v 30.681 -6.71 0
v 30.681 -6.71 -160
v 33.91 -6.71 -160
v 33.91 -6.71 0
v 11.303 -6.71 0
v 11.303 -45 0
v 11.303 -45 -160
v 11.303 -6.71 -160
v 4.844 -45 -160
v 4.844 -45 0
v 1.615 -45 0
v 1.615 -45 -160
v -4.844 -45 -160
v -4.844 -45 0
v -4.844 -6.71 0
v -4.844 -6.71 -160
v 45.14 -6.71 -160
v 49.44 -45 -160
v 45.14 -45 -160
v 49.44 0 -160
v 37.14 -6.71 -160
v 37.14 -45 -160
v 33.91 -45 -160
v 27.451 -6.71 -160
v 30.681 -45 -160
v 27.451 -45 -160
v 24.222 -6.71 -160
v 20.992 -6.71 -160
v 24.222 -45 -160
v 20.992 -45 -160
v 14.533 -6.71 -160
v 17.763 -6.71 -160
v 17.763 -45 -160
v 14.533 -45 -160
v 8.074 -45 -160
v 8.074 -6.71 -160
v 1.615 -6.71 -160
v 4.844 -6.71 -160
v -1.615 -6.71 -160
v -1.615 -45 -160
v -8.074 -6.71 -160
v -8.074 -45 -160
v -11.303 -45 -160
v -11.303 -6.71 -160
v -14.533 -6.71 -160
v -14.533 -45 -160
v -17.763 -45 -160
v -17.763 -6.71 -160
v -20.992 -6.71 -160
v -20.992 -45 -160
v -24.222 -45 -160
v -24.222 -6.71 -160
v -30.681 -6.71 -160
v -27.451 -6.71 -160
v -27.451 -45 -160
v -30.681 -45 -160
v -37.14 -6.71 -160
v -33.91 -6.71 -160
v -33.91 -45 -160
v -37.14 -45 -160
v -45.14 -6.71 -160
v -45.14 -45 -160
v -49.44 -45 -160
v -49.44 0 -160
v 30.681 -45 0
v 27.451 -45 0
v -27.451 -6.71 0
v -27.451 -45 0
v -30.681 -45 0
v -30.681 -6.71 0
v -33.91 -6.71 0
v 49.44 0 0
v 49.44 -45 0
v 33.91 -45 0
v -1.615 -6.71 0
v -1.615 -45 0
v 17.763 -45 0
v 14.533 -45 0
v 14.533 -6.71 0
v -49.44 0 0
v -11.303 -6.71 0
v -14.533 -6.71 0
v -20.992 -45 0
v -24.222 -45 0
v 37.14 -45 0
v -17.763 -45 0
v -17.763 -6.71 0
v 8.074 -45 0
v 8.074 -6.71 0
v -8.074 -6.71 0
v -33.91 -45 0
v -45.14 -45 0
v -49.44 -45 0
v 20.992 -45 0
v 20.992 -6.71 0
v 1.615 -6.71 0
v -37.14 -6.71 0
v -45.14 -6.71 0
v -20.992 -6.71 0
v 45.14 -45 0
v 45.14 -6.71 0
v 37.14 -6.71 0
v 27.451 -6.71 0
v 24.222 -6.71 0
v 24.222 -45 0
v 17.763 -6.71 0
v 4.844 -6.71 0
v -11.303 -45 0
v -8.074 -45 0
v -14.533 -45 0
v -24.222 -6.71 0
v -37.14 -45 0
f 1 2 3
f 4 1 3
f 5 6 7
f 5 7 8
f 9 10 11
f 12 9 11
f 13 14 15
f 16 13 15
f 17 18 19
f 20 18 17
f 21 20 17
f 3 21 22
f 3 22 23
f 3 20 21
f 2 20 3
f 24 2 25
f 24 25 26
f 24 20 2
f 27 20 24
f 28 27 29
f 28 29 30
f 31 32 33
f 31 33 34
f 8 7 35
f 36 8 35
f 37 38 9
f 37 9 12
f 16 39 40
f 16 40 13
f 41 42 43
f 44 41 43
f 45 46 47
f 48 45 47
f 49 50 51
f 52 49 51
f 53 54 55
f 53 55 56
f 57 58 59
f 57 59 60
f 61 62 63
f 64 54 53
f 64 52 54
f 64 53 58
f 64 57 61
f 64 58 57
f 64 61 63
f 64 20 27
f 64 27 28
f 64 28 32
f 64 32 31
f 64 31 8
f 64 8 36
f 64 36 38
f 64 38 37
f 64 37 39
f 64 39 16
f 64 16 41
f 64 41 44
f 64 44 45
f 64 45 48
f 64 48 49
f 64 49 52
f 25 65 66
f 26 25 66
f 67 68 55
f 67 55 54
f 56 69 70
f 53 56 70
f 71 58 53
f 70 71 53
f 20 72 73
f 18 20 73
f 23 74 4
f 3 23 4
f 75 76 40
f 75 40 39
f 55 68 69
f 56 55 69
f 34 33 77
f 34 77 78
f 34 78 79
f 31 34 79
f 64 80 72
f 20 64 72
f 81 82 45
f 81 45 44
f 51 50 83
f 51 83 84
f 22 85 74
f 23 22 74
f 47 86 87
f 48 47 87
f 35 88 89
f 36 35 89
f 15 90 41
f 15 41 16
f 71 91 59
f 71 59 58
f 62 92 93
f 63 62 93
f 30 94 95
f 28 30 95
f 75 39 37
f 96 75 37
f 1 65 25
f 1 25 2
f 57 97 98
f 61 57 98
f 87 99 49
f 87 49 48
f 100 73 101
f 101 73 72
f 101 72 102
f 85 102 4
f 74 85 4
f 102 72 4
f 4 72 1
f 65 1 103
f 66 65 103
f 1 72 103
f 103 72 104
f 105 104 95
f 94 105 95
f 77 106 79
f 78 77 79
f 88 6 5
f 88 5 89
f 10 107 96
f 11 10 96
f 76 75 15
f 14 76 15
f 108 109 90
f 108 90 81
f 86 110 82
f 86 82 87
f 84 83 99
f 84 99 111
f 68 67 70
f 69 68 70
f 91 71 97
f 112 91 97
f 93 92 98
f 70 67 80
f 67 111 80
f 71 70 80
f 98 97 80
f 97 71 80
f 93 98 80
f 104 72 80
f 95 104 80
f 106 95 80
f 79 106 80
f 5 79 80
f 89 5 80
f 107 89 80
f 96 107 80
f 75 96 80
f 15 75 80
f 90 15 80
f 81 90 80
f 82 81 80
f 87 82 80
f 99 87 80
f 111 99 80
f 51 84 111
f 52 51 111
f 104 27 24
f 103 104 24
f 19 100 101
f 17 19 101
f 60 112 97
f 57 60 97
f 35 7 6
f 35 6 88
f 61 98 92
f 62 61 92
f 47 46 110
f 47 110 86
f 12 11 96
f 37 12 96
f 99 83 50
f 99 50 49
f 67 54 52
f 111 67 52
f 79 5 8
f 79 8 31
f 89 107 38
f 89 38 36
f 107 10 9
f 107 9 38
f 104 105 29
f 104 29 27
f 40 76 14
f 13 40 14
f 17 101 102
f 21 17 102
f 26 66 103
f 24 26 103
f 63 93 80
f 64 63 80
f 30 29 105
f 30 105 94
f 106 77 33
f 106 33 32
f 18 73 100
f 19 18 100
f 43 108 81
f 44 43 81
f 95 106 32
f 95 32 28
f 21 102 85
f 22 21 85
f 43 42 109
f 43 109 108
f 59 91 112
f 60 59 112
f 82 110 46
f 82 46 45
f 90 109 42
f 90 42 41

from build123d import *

# Parameters (mm, degrees)
BOSS_EXTRUDE1_DEPTH = 160
SKETCH4_W           = 3.229565218
SKETCH4_H           = 38.29
SKETCH4_W_2         = 3.229565217
CUT_EXTRUDE1_DEPTH  = 174.405056443


with BuildPart() as part:
    # Sketch1 → Boss-Extrude1 (new body)
    with BuildSketch(Plane.XY):
        Polygon((-49.44, -45), (-49.44, 0), (49.44, 0), (49.44, -45), (45.14, -45), (45.14, -6.71), (37.14, -6.71), (37.14, -45), (-37.14, -45), (-37.14, -6.71), (-45.14, -6.71), (-45.14, -45), align=None)
    extrude(amount=-BOSS_EXTRUDE1_DEPTH)

    # Sketch4 → Cut-Extrude1 (cut, through all)
    with BuildSketch(Plane.XY):
        with Locations((-32.295652174, -25.855)):
            Rectangle(SKETCH4_W, SKETCH4_H)
        with Locations((-25.836521739, -25.855)):
            Rectangle(SKETCH4_W, SKETCH4_H)
        with Locations((-19.377391305, -25.855)):
            Rectangle(SKETCH4_W_2, SKETCH4_H)
        with Locations((-12.91826087, -25.855)):
            Rectangle(SKETCH4_W_2, SKETCH4_H)
        with Locations((-6.459130435, -25.855)):
            Rectangle(SKETCH4_W_2, SKETCH4_H)
        with Locations((0, -25.855)):
            Rectangle(SKETCH4_W, SKETCH4_H)
        with Locations((6.459130435, -25.855)):
            Rectangle(SKETCH4_W_2, SKETCH4_H)
        with Locations((12.91826087, -25.855)):
            Rectangle(SKETCH4_W_2, SKETCH4_H)
        with Locations((19.377391305, -25.855)):
            Rectangle(SKETCH4_W_2, SKETCH4_H)
        with Locations((25.836521739, -25.855)):
            Rectangle(SKETCH4_W, SKETCH4_H)
        with Locations((32.295652174, -25.855)):
            Rectangle(SKETCH4_W, SKETCH4_H)
    extrude(amount=-CUT_EXTRUDE1_DEPTH, mode=Mode.SUBTRACT)


solid = part.part
